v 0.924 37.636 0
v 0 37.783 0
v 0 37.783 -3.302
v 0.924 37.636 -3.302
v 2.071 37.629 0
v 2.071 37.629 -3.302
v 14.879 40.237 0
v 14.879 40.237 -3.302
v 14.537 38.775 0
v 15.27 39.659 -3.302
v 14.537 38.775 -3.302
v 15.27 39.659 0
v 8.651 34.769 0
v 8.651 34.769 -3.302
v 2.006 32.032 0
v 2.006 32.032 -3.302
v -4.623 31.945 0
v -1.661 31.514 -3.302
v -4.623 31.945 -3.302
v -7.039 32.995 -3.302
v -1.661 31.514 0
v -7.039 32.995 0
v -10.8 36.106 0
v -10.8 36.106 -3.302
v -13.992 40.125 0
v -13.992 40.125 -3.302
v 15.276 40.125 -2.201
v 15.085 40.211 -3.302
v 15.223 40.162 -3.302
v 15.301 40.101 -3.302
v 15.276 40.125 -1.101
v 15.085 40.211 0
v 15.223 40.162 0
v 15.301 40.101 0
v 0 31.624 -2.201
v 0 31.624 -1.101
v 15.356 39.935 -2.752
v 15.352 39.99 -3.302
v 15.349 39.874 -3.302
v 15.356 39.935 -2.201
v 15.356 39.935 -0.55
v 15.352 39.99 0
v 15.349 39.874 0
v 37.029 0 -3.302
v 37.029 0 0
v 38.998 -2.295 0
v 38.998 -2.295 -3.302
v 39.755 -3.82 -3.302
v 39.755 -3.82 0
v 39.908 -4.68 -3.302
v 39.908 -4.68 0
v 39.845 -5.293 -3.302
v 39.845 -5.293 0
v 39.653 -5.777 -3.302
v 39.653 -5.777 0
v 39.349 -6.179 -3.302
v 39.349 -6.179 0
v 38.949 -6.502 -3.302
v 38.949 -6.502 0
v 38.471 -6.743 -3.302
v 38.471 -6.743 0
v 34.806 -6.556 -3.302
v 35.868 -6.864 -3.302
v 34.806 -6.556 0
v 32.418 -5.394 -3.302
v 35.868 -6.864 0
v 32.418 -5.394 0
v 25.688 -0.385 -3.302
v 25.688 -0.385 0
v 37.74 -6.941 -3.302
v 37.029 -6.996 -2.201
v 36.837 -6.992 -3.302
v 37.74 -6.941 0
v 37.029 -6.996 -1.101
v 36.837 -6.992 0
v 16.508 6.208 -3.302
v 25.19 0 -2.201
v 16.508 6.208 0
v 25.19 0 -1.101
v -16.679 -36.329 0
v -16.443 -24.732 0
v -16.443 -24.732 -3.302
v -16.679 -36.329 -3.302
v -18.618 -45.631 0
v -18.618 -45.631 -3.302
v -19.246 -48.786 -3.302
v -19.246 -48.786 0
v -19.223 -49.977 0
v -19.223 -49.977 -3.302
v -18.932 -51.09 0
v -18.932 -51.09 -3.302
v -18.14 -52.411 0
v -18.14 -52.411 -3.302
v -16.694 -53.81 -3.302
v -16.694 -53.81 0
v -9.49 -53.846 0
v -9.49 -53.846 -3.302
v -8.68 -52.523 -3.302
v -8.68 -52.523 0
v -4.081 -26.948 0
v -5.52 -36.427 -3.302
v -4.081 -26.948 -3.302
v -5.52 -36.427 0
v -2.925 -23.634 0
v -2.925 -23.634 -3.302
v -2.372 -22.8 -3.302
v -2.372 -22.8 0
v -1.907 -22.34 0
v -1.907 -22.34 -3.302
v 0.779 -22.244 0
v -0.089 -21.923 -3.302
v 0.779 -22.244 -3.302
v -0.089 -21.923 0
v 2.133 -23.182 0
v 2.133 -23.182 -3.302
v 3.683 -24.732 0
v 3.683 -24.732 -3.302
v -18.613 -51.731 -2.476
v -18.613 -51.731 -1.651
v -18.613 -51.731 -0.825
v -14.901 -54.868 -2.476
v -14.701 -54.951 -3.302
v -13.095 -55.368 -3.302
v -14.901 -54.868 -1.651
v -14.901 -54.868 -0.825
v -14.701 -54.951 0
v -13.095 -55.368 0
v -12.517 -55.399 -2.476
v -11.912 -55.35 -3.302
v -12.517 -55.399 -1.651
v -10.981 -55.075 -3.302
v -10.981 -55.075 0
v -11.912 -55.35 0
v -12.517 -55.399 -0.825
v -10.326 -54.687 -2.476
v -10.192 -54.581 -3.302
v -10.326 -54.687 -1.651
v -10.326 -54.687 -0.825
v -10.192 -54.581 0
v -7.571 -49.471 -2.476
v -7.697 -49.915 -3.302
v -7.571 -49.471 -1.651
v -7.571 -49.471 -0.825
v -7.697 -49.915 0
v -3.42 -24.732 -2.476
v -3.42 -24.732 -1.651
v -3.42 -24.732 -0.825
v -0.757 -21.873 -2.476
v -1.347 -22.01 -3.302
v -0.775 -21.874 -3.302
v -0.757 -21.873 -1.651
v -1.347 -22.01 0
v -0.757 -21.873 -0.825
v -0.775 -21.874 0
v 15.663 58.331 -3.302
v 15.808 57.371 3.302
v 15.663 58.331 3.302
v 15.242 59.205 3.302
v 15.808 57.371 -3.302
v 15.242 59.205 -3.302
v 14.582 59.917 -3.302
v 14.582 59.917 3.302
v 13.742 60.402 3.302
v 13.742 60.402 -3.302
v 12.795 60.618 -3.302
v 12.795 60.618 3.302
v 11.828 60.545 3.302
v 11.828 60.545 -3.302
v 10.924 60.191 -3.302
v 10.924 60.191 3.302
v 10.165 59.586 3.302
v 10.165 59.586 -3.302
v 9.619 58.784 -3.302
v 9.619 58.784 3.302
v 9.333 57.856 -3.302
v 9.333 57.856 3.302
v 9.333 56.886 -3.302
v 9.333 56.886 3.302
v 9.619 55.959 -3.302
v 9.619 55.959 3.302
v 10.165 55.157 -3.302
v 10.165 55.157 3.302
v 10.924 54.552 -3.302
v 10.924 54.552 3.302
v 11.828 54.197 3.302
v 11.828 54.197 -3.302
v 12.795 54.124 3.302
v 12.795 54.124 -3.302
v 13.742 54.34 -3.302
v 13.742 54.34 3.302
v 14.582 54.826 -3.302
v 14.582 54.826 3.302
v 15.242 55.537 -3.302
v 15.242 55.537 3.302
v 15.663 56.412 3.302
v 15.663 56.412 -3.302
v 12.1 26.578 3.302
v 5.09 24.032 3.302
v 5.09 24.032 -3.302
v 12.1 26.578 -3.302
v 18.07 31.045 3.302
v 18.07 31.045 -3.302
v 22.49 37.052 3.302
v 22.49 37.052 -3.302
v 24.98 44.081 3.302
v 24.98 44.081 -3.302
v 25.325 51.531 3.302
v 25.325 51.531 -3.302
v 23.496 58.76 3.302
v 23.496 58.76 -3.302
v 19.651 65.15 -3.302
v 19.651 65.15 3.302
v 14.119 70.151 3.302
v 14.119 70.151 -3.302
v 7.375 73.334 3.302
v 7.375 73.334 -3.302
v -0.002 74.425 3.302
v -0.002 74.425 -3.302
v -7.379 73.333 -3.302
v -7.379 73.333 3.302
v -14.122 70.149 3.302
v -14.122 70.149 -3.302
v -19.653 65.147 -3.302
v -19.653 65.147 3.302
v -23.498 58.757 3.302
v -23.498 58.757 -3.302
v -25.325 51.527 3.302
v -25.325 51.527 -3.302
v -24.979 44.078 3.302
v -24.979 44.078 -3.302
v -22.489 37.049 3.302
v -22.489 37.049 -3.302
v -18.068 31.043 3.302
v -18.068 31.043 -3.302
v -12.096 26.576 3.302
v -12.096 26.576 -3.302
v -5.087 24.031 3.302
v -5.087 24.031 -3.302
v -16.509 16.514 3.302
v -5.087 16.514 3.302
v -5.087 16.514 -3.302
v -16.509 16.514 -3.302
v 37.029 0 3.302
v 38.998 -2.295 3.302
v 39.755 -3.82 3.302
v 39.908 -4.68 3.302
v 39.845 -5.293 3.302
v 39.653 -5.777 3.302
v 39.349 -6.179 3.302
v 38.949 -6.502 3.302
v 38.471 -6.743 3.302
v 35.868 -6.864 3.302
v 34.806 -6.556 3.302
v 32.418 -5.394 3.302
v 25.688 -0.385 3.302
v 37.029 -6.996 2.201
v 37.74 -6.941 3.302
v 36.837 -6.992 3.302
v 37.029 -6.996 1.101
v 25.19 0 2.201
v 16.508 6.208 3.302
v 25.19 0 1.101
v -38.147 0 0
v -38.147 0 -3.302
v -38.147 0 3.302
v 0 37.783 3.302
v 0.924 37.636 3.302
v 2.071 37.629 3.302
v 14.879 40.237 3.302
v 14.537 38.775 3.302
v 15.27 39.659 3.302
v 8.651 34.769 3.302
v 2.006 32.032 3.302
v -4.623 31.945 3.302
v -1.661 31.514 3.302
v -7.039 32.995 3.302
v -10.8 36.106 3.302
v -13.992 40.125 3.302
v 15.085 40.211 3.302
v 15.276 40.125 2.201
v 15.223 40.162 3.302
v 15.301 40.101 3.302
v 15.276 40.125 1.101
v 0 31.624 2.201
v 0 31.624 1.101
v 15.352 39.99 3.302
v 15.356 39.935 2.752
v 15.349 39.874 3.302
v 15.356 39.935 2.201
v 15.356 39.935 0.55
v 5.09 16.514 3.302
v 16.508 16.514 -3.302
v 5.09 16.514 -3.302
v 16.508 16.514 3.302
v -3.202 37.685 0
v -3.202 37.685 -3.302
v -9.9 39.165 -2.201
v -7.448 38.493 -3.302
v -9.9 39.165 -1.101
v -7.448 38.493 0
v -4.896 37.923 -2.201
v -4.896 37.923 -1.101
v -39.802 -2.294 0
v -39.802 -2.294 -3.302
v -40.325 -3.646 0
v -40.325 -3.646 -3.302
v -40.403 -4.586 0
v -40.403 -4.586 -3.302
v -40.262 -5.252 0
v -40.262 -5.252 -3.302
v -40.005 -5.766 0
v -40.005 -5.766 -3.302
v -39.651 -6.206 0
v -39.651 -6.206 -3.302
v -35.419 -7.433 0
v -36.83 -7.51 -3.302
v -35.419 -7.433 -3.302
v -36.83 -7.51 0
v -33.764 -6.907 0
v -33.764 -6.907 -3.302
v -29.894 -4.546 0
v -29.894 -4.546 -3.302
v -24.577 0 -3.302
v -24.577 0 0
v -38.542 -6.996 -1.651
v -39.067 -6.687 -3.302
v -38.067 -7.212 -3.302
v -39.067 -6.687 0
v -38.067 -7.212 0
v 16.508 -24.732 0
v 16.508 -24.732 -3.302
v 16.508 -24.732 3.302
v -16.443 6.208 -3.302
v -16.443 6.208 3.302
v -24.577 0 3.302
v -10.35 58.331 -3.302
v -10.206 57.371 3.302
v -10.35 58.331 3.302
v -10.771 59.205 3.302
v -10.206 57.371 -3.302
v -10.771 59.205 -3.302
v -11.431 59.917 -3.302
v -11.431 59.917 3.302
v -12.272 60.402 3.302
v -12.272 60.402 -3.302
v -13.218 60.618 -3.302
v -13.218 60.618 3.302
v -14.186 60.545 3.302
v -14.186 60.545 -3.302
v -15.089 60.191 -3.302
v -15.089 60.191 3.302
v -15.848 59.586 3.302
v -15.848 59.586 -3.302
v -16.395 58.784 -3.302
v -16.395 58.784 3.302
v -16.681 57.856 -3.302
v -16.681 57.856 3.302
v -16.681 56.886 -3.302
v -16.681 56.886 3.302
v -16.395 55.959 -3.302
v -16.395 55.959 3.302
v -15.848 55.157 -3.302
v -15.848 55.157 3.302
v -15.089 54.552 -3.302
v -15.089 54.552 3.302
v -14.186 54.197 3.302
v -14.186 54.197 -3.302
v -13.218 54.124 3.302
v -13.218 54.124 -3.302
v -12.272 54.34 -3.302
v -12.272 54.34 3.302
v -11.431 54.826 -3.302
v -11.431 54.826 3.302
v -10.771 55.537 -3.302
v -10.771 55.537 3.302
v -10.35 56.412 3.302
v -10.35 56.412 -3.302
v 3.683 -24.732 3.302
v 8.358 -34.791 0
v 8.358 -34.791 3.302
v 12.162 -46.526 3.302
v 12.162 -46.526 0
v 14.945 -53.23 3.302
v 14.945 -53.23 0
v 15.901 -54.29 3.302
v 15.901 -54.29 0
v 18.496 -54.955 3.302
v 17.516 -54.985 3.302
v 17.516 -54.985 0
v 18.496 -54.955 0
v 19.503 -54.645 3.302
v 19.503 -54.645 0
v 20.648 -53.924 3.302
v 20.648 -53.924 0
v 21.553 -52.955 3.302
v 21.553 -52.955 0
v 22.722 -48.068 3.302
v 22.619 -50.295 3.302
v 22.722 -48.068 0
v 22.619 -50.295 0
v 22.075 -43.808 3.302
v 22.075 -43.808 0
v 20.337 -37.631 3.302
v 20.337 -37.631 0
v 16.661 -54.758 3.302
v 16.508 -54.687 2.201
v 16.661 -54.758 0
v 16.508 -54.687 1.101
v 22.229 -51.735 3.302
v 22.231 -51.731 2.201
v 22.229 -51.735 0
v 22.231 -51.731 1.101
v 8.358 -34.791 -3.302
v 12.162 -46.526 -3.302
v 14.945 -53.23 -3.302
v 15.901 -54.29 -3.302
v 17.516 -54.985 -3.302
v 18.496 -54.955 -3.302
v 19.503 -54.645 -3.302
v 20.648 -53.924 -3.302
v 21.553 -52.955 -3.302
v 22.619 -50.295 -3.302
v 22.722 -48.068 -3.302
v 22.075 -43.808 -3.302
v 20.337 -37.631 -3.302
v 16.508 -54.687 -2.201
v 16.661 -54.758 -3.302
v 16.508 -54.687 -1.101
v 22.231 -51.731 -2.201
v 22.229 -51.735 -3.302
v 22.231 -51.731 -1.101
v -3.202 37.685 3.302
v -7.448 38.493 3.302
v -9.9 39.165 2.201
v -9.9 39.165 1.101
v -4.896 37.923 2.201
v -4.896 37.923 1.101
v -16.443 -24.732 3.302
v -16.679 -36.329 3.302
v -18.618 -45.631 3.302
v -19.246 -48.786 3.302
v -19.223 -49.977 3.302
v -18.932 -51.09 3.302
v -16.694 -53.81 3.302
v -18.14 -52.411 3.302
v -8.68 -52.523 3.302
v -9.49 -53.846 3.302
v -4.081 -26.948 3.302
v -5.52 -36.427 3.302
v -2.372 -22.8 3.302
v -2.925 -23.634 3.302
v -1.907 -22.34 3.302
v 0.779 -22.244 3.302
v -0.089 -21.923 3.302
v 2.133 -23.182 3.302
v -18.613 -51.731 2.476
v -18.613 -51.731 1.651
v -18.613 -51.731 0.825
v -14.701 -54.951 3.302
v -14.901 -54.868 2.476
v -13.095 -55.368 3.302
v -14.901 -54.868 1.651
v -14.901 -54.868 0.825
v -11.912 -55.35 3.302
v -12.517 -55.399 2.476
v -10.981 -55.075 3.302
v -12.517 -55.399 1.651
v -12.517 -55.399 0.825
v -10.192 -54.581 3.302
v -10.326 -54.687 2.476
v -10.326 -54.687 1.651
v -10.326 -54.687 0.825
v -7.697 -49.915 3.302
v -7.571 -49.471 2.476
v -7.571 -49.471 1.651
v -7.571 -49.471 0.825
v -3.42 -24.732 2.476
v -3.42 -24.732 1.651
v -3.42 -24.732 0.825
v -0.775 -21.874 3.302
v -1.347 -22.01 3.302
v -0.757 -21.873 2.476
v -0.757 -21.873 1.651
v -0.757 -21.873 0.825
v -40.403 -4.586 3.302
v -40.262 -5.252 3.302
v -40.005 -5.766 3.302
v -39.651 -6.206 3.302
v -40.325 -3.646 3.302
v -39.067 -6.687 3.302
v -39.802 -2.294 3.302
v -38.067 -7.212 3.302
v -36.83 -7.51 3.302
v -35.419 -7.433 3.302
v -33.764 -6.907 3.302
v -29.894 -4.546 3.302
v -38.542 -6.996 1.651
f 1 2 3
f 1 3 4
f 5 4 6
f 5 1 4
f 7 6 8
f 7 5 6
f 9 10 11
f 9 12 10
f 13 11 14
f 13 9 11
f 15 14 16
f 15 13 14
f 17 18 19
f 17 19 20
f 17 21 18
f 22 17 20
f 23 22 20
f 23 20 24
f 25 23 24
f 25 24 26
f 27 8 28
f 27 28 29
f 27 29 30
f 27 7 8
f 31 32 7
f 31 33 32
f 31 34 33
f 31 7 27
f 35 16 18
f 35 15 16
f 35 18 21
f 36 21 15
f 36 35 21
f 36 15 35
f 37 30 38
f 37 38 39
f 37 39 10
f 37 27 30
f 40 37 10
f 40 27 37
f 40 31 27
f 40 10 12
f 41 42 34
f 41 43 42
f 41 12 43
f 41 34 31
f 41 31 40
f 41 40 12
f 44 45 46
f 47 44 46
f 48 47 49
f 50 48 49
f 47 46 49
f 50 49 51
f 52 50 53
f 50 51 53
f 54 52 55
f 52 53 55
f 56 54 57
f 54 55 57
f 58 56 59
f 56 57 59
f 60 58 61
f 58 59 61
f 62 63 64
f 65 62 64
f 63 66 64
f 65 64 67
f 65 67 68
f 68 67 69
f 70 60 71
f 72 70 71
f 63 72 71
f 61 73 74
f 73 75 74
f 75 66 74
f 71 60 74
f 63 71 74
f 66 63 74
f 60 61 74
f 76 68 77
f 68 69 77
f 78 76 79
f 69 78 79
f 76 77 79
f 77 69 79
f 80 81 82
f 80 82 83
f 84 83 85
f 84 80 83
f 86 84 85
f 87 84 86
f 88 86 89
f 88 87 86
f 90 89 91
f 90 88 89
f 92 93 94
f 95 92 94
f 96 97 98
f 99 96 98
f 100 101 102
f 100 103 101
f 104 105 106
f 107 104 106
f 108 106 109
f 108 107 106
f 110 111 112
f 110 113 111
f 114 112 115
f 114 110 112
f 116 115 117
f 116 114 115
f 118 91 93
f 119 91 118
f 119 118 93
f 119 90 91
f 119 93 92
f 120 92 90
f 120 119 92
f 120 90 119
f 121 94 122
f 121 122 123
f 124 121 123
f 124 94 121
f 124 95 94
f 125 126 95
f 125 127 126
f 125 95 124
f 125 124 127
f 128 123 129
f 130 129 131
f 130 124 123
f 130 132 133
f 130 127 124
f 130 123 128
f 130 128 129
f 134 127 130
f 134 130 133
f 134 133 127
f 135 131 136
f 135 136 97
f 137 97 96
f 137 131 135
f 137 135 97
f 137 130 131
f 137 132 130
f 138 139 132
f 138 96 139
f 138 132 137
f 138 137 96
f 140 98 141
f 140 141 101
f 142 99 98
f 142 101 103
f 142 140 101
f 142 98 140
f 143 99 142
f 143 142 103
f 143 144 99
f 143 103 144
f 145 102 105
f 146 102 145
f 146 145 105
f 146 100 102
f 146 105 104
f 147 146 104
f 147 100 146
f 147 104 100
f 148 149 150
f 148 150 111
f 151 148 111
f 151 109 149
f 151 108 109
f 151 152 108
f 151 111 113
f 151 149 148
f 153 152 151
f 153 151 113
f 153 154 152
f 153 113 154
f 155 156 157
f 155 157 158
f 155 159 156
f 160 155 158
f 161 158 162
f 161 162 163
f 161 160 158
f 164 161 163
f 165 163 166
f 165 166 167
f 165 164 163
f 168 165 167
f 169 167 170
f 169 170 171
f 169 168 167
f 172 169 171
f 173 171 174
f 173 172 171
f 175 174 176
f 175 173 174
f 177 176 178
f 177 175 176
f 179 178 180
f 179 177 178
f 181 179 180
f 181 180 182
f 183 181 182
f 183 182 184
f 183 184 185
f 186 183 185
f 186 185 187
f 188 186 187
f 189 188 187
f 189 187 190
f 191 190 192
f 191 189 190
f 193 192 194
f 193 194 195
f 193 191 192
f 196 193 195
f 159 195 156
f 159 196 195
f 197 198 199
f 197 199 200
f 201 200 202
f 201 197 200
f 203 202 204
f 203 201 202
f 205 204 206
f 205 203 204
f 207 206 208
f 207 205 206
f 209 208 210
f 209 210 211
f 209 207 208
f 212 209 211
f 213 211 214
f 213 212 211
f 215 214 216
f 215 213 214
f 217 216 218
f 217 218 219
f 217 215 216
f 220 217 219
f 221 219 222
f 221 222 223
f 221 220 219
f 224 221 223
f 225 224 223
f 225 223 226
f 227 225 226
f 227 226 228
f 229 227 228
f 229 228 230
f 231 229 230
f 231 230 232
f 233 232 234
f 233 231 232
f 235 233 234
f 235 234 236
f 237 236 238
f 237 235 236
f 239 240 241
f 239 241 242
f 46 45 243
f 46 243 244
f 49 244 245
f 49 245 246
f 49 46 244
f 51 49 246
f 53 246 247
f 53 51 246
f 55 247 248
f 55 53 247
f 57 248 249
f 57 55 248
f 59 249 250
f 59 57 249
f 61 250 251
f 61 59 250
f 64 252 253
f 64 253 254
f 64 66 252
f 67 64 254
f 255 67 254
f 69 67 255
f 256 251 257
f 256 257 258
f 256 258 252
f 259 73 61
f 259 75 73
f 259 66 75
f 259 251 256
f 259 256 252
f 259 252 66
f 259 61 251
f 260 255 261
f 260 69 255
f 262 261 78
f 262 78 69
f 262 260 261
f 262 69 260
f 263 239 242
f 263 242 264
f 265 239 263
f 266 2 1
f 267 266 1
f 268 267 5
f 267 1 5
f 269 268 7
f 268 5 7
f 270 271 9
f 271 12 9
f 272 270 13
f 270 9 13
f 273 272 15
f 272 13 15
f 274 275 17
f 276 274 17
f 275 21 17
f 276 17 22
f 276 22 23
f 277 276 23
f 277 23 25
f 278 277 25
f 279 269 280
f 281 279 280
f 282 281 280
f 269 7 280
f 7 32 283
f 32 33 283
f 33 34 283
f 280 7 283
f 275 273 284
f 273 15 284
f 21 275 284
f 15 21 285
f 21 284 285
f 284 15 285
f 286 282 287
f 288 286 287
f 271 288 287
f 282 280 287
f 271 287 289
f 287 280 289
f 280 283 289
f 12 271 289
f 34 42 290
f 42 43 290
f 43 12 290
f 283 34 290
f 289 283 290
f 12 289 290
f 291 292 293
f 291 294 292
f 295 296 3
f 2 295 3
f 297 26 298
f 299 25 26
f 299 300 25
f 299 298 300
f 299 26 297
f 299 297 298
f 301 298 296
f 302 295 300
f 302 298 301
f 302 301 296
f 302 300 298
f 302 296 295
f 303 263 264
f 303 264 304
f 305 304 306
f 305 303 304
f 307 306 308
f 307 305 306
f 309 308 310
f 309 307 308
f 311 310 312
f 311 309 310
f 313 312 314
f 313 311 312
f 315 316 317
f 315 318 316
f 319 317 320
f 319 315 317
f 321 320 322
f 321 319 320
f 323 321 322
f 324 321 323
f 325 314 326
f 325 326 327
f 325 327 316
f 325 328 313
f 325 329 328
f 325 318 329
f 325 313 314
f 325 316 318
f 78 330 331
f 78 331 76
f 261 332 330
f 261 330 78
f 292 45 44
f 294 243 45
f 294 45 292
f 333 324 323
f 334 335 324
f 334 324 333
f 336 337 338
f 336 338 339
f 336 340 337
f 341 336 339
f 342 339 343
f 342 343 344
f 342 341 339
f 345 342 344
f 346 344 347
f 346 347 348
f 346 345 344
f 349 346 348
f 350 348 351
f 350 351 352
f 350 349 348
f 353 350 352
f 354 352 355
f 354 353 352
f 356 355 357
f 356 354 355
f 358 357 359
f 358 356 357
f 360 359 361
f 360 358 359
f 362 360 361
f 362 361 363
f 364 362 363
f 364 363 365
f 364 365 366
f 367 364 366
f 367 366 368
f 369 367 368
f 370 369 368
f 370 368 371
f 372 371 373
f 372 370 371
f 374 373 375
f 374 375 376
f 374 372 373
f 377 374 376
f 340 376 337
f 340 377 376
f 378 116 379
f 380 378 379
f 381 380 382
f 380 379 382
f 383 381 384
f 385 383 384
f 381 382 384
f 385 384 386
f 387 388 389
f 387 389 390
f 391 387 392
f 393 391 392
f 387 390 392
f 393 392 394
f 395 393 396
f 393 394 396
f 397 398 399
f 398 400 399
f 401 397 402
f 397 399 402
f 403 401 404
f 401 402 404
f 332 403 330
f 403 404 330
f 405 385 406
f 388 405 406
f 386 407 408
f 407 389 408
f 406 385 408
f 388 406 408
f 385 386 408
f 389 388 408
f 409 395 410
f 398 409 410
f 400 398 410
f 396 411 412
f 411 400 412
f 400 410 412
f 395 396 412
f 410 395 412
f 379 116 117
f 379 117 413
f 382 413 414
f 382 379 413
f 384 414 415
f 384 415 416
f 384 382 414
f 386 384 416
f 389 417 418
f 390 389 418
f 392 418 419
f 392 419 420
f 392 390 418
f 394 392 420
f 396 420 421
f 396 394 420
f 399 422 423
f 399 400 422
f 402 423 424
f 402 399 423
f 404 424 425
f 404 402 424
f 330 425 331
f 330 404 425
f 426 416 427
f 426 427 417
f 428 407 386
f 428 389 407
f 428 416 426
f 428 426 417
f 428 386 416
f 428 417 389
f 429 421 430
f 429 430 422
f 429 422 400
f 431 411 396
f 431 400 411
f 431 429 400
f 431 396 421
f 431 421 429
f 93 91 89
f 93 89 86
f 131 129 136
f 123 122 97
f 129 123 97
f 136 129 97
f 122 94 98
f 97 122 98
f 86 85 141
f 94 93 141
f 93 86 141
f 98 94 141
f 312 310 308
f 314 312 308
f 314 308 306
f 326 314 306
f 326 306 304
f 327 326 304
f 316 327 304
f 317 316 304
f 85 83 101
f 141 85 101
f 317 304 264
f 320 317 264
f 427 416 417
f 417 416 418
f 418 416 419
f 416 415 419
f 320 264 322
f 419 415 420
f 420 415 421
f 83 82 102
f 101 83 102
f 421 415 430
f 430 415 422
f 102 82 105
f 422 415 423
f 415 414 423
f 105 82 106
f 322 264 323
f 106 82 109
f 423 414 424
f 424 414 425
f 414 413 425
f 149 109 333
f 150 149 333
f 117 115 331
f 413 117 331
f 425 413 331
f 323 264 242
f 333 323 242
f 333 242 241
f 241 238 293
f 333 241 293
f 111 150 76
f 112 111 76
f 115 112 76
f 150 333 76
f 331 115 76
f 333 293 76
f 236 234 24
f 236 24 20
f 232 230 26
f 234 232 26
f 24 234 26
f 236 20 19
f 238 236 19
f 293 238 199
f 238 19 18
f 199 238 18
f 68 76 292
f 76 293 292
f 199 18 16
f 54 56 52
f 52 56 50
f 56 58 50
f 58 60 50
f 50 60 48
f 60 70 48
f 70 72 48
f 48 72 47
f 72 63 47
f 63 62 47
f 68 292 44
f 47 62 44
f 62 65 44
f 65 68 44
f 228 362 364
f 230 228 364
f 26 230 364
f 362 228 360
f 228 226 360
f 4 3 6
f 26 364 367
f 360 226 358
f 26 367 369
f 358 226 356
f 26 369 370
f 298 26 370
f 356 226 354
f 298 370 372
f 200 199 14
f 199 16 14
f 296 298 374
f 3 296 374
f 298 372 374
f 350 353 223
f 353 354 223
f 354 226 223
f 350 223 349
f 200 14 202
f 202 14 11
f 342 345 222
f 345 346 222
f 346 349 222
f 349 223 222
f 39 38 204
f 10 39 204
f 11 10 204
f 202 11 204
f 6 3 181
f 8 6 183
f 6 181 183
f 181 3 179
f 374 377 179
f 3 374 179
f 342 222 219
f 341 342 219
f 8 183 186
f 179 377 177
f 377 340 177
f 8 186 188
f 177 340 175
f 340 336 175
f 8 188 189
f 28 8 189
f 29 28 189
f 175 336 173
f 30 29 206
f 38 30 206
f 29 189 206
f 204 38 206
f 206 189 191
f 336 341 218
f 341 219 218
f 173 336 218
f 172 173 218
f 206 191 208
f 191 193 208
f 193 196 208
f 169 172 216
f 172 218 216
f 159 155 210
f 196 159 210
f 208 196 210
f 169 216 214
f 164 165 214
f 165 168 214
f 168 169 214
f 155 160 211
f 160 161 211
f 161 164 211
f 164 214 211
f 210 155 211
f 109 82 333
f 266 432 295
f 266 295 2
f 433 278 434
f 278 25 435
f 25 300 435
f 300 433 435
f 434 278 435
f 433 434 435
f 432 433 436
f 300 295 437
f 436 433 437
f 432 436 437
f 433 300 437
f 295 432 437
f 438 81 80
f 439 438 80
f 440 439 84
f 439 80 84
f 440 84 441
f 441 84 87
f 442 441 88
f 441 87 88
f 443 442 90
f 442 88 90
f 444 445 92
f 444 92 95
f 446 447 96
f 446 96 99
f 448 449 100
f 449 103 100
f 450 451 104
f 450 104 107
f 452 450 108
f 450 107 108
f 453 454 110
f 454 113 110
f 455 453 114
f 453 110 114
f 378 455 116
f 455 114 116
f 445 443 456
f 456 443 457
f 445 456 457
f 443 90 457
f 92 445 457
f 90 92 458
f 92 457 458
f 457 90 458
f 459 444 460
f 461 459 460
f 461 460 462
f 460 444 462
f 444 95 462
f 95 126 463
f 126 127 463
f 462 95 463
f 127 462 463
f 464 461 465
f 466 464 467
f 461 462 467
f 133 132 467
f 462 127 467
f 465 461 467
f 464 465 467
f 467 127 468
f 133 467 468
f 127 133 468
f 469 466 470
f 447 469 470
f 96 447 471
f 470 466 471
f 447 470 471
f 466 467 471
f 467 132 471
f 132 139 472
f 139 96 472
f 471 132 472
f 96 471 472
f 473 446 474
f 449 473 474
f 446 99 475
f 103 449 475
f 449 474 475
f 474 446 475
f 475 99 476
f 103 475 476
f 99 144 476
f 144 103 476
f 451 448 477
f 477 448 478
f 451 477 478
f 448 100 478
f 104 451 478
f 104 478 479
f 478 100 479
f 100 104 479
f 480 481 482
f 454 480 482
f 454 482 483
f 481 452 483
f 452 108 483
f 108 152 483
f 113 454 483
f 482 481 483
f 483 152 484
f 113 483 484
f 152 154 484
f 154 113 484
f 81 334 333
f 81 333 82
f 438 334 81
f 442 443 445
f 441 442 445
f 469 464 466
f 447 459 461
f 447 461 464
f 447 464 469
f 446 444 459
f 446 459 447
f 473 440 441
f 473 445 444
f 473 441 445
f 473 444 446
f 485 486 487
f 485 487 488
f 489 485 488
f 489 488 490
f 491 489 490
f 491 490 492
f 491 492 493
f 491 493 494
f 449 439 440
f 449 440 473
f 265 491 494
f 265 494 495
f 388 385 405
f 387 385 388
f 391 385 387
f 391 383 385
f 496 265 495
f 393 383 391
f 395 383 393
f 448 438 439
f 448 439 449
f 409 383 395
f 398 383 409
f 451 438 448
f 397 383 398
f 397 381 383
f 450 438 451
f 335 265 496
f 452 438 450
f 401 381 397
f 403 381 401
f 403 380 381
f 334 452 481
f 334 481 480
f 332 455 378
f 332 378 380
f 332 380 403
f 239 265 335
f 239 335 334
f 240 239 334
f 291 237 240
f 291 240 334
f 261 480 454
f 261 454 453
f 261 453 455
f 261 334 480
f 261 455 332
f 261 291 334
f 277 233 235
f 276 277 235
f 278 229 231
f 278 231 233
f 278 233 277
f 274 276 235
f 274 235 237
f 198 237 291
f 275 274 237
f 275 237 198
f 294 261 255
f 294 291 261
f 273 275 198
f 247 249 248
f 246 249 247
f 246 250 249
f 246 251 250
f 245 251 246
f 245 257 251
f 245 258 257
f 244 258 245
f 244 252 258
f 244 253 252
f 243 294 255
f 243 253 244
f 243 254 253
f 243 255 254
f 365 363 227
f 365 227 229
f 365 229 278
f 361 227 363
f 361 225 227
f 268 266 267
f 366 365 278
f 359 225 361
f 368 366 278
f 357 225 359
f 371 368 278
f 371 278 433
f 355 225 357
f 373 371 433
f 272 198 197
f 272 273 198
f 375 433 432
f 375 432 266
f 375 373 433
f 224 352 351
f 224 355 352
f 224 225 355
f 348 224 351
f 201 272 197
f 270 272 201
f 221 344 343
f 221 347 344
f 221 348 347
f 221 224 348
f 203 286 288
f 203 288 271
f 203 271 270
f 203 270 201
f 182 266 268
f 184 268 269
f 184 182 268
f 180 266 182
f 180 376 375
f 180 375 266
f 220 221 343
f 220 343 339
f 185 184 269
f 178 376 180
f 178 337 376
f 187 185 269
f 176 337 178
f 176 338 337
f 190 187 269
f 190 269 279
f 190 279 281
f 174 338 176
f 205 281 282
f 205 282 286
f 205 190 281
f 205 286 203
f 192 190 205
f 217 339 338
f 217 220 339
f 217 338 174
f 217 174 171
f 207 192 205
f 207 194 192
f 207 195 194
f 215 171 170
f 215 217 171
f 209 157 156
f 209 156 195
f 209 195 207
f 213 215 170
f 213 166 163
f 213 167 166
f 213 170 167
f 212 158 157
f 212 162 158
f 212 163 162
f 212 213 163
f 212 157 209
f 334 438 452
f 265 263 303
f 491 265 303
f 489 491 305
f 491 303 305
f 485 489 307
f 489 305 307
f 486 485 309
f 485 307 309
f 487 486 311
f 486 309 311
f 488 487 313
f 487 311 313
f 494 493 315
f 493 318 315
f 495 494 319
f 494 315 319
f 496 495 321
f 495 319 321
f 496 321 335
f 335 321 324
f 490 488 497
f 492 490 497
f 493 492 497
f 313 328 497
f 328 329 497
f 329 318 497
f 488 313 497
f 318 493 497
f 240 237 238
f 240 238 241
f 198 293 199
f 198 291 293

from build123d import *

# Parameters (mm, degrees)
F0_R     = 3.2557747271
F1_DEPTH = 3.302


with BuildPart() as f1:
    # F0 (on Top) → F1 (new body, symmetric)
    with BuildSketch(Plane.XY):
        with BuildLine():
            Line((5.0902032033, 16.5135953575), (5.0902032033, 24.0319953575))
            ThreePointArc((5.0902032033, 24.0319953575), (-0.0017916206, 74.4254382859), (-5.0866922917, 24.0312790348))
            Line((-5.0866922917, 24.0312790348), (-5.0866922917, 16.5135953575))
            Line((-5.0866922917, 16.5135953575), (-16.5087468922, 16.5135953575))
            Line((-16.5087468922, 16.5135953575), (-38.1471216679, 0))
            add(Edge.make_bspline(
                [(-38.1471216679, 0), (-41.8173019866, -4.1479634152), (-38.1038363991, -8.9643203868), (-32.5479097664, -7.466728799), (-24.5768346702, 0)],
                knots=[0, 0, 0, 0, 0.4011217193, 1, 1, 1, 1], degree=3))
            Line((-24.5768346702, 0), (-16.4426919073, 6.2076724134))
            Line((-16.4426919073, 6.2076724134), (-16.4426919073, -24.7321557254))
            add(Edge.make_bspline(
                [(-16.4426919073, -24.7321557254), (-15.2728445828, -43.0595688522), (-24.543186495, -49.8876527125), (-5.0638806577, -61.2356108164), (-6.4912155804, -22.7476959147), (0, -20.5655153841), (3.6832357291, -24.7321557254)],
                knots=[0, 0, 0, 0, 0.3177236577, 0.4988105107, 0.8372916449, 1, 1, 1, 1], degree=3))
            add(Edge.make_bspline(
                [(3.6832357291, -24.7321557254), (11.528535746, -38.3299142122), (12.3383591137, -58.7577995665), (26.8448871782, -51.4598281753), (19.2311480641, -35.9646044672), (16.5078004939, -24.7321557254)],
                knots=[0, 0, 0, 0, 0.4228463026, 0.6108480109, 1, 1, 1, 1], degree=3))
            Line((16.5078004939, -24.7321557254), (16.5078004939, 6.2076724134))
            add(Edge.make_bspline(
                [(37.029132247, 0), (41.8643541634, -4.6797520481), (36.7340706254, -10.2547104205), (24.0421511033, 1.6222858886), (20.9620334208, 2.5663857814), (16.5078004939, 6.2076724134)],
                knots=[0, 0, 0, 0, 0.2749382686, 0.6604031241, 1, 1, 1, 1], degree=3))
            Line((37.029132247, 0), (16.5078004939, 16.5135953575))
            Line((16.5078004939, 16.5135953575), (5.0902032033, 16.5135953575))
        make_face()
        with Locations((-13.4614137933, 57.3711618781)):
            Circle(F0_R, mode=Mode.SUBTRACT)
        with BuildLine():
            add(Edge.make_bspline(
                [(0, 37.7828329802), (3.9473944344, 36.7329530418), (25.2943186682, 45.4993517341), (-2.451900255, 26.0626289111), (-10.5410218239, 35.2789796889), (-13.9921056107, 40.1252135634)],
                knots=[0, 0, 0, 0, 0.3233287002, 0.6672135368, 1, 1, 1, 1], degree=3))
            add(Edge.make_bspline(
                [(-13.9921056107, 40.1252135634), (-10.6967361644, 39.7676564753), (-4.500658717, 36.909904331), (0, 37.7828329802)],
                knots=[0, 0, 0, 0, 14.1868166344, 14.1868166344, 14.1868166344, 14.1868166344], degree=3))
        make_face(mode=Mode.SUBTRACT)
        with Locations((12.5520825386, 57.3711618781)):
            Circle(F0_R, mode=Mode.SUBTRACT)
    extrude(amount=F1_DEPTH, both=True)


solid = f1.part
